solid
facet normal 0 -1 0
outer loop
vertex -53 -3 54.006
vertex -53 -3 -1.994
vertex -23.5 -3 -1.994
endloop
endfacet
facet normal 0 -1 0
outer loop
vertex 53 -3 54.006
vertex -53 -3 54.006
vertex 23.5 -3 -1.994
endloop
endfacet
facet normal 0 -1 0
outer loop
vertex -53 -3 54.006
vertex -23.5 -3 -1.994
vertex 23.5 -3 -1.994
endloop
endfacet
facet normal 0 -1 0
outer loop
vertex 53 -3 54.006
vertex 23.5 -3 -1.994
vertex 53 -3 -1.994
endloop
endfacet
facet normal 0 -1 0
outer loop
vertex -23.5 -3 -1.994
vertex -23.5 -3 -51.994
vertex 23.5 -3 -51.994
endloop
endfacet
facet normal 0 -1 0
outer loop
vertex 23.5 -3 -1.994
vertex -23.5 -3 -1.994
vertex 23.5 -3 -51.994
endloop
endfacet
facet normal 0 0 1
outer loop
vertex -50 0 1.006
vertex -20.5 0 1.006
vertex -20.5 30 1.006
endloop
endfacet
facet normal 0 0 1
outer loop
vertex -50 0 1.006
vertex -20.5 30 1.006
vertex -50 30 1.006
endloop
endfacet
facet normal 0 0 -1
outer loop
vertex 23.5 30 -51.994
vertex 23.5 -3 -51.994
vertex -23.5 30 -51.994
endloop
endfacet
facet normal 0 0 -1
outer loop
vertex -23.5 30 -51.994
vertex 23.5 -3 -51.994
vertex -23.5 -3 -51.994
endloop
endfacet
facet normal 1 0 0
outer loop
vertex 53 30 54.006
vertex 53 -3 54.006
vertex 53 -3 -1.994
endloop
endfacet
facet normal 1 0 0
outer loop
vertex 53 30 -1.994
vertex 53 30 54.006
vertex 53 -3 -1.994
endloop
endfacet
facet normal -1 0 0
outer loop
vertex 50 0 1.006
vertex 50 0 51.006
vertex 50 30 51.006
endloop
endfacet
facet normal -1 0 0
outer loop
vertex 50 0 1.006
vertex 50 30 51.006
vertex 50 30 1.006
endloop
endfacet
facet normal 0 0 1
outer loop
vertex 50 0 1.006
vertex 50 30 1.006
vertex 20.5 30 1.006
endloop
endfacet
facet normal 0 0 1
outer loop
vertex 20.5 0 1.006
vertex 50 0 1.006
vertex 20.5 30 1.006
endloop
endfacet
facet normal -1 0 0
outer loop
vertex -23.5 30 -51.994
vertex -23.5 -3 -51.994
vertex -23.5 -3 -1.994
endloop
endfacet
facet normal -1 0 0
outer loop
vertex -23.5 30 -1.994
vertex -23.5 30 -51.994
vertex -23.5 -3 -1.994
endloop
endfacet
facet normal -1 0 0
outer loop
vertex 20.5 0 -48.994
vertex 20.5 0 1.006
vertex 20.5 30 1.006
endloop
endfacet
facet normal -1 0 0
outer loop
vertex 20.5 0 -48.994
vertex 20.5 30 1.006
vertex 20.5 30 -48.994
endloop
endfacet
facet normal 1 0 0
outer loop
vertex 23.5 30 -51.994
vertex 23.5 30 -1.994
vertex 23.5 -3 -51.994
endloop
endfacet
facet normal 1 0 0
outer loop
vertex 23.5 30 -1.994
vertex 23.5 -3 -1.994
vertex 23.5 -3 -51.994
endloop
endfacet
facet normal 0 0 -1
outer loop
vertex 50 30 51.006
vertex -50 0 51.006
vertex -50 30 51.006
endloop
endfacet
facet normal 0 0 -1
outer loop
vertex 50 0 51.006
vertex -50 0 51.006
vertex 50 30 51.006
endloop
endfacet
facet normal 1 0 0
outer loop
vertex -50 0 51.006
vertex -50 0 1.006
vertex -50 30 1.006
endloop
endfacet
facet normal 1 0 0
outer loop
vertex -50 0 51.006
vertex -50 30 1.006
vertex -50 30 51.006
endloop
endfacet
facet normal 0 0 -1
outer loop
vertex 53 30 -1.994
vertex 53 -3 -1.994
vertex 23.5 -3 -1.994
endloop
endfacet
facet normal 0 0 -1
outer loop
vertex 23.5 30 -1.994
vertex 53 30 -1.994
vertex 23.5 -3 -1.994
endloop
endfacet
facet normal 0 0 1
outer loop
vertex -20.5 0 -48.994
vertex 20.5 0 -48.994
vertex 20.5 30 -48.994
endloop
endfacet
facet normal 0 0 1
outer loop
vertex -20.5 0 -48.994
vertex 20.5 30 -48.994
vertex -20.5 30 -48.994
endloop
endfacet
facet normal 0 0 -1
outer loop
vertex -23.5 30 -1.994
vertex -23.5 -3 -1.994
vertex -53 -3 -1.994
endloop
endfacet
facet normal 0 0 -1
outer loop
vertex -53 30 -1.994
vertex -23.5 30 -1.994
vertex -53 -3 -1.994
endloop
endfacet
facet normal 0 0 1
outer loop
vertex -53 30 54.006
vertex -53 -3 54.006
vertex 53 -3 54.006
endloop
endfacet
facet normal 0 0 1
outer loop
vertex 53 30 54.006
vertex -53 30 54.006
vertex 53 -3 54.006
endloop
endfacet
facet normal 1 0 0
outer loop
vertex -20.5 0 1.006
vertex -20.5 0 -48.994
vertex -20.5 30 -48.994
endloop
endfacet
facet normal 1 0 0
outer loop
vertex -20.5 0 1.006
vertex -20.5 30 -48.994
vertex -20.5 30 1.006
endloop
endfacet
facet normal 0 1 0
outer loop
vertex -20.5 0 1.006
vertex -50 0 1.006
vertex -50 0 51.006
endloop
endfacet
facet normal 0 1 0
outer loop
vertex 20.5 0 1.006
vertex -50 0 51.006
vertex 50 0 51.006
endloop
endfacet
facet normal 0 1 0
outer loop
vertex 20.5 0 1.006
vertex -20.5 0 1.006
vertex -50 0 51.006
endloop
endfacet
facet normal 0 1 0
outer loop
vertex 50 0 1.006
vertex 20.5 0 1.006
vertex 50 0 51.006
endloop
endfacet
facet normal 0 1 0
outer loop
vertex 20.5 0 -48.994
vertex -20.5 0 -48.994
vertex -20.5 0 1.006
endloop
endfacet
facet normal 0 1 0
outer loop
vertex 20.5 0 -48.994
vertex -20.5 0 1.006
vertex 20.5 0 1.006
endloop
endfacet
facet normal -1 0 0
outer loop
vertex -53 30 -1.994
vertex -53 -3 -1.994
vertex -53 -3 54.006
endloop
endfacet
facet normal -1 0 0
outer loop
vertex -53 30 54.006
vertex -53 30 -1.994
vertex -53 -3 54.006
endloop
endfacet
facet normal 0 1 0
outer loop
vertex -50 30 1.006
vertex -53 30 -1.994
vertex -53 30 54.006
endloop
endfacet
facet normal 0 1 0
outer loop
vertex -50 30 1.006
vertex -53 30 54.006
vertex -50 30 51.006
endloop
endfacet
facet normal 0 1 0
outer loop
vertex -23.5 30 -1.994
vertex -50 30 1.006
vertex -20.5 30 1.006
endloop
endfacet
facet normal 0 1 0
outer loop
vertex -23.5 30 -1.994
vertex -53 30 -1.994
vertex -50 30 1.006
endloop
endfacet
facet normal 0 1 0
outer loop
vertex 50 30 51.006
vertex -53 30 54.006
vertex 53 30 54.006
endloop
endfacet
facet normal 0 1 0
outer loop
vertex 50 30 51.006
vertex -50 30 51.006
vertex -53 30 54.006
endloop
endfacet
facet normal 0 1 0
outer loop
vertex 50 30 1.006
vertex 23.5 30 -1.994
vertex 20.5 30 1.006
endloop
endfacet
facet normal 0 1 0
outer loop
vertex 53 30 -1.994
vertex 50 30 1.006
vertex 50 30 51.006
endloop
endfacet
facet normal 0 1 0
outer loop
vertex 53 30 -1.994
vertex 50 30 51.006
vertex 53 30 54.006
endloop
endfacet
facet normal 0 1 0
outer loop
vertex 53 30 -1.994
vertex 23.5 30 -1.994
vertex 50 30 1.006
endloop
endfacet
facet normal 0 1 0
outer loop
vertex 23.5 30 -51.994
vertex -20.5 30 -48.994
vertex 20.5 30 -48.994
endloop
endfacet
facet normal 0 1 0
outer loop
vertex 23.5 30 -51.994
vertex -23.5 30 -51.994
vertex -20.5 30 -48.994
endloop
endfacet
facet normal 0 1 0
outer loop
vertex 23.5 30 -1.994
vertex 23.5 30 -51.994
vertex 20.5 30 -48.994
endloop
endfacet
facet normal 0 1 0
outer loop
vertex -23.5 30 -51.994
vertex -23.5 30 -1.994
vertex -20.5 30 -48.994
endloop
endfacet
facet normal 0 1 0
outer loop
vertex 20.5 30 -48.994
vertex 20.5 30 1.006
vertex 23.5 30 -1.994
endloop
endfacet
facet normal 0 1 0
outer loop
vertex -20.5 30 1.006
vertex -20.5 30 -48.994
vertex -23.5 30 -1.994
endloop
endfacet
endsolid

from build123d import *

# Parameters (mm, degrees)
BOSS_EXTRUDE1_DEPTH = 30
SHELL1_T            = 3


with BuildPart() as part:
    # Sketch1 → Boss-Extrude1 (new body)
    with BuildSketch(Plane(origin=(0, 0, 0), x_dir=(1, 0, 0), z_dir=(0, 1, 0))):
        Polygon((20.5, 48.994047619), (-20.5, 48.994047619), (-20.5, -1.005952381), (-50, -1.005952381), (-50, -51.005952381), (50, -51.005952381), (50, -1.005952381), (20.5, -1.005952381), align=None)
    extrude(amount=BOSS_EXTRUDE1_DEPTH)

    # Shell1
    shell1_openings = [part.faces().sort_by_distance(p)[0] for p in [
        (0, 30, 11.466945289),
    ]]
    offset(amount=SHELL1_T, openings=shell1_openings, kind=Kind.INTERSECTION)


solid = part.part
